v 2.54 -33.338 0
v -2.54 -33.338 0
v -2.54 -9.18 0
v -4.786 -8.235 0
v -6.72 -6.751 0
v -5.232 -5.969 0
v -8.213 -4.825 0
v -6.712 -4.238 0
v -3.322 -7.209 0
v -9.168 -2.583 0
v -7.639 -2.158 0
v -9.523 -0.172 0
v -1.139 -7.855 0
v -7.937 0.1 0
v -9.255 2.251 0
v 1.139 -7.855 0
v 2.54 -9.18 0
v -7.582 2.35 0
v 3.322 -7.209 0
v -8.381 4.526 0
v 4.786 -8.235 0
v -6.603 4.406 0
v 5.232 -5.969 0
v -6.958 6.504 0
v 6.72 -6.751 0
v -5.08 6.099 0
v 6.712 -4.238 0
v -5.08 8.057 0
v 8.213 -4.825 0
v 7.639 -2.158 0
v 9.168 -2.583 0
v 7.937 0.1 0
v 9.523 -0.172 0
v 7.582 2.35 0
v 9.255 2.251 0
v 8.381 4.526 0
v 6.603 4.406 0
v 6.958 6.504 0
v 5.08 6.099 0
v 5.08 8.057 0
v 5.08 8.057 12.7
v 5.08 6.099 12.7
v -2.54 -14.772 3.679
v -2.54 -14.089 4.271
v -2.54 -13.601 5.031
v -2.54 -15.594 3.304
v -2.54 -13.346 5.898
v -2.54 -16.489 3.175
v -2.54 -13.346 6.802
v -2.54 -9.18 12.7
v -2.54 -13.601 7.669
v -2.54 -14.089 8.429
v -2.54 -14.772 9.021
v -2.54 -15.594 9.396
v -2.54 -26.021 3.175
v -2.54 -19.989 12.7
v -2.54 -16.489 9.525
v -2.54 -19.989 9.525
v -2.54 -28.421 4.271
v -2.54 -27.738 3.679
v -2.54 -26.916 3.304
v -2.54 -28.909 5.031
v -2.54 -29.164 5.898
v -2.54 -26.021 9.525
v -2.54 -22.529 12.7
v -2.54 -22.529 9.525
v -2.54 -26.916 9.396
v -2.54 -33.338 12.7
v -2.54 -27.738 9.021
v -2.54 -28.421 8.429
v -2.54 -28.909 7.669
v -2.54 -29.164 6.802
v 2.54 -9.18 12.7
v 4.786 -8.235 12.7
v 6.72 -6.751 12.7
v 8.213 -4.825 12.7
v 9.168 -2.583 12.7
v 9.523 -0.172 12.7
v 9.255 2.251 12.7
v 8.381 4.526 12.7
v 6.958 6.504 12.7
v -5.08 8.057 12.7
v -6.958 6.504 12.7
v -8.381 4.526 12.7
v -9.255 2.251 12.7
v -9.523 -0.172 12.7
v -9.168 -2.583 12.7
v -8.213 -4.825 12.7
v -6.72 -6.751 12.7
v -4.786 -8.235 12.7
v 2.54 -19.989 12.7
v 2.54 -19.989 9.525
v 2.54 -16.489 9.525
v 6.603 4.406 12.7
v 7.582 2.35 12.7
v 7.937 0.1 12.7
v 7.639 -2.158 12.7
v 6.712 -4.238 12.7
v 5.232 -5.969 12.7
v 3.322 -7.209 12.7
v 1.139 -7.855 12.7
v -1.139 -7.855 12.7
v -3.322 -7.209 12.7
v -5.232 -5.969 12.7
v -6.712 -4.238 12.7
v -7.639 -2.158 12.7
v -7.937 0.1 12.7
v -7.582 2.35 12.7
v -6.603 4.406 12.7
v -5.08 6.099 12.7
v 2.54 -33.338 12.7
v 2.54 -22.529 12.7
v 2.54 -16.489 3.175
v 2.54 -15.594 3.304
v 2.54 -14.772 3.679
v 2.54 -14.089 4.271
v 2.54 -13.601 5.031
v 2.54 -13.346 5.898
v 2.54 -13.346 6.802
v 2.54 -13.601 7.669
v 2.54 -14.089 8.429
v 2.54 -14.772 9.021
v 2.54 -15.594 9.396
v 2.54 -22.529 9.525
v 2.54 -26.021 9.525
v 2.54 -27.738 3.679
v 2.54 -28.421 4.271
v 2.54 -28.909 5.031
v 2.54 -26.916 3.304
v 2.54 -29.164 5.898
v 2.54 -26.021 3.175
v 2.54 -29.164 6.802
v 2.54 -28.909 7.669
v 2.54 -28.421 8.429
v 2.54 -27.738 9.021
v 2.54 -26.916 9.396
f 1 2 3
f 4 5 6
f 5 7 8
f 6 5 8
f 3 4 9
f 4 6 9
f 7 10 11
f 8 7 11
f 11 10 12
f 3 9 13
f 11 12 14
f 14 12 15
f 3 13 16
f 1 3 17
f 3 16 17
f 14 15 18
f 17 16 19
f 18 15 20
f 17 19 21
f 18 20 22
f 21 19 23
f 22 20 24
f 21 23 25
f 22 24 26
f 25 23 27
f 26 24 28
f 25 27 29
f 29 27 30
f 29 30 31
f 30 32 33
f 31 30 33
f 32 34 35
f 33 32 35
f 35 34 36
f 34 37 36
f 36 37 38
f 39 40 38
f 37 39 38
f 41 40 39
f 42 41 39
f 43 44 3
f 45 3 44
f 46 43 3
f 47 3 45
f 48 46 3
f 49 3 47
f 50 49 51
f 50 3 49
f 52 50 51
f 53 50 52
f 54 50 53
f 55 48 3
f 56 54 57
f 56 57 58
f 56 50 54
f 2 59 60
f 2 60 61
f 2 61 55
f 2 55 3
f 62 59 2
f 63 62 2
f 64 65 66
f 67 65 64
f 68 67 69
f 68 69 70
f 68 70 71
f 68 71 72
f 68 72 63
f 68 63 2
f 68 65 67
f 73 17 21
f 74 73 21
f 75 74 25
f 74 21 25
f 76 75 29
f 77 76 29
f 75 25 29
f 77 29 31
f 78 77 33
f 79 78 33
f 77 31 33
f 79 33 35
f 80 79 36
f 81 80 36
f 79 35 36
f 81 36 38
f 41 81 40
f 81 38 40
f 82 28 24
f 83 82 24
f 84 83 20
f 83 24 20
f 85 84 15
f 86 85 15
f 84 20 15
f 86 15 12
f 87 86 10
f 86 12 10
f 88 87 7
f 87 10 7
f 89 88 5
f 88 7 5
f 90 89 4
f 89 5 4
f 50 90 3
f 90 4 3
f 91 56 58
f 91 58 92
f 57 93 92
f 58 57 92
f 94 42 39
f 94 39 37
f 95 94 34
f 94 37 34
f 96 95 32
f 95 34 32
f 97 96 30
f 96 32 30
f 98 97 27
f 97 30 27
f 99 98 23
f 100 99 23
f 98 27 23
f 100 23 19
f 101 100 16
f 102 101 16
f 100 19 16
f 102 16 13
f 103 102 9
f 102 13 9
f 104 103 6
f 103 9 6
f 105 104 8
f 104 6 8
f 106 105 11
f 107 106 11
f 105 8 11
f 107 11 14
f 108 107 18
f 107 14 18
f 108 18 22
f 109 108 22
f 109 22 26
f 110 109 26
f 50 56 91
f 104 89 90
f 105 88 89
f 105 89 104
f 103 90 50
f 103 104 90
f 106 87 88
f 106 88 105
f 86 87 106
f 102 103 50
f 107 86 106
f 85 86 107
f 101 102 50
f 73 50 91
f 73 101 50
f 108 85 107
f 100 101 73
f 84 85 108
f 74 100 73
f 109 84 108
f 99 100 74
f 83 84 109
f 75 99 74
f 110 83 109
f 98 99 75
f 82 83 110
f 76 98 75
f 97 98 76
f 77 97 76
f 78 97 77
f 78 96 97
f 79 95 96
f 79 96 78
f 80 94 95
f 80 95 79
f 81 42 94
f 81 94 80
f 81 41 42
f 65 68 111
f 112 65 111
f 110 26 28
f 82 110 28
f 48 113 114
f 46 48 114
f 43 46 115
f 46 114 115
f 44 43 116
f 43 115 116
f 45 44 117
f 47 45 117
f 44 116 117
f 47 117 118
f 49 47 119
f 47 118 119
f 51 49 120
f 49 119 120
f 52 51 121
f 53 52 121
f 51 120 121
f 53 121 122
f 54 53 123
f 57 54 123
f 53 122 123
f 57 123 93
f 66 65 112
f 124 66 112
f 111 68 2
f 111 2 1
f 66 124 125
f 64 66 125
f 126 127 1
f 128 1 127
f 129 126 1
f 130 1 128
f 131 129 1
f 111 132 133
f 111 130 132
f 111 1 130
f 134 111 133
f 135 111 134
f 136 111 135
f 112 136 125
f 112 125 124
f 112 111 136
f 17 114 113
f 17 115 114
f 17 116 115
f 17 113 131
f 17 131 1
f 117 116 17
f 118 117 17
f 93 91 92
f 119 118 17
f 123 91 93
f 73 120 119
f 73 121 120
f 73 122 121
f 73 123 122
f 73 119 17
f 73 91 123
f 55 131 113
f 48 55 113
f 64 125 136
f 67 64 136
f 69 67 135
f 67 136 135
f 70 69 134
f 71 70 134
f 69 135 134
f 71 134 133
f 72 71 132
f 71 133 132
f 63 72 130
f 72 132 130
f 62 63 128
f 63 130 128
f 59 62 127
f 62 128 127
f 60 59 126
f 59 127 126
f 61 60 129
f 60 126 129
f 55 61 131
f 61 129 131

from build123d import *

# Parameters (mm, degrees)
F1_DEPTH = 12.7
F3_DEPTH = 12.7
F5_DEPTH = 5.08
F6_W     = 5.08
F6_H     = 2.54
F7_DEPTH = 3.175


with BuildPart() as f1:
    # F0 (on Top) → F1 (new body)
    with BuildSketch(Plane.XY):
        with BuildLine():
            Line((-5.08, 6.0989758362), (-5.08, 8.0572467382))
            ThreePointArc((-5.08, 8.0572467382), (0, -9.525), (5.08, 8.0572467382))
            Line((5.08, 8.0572467382), (5.08, 6.0989758362))
            ThreePointArc((5.08, 6.0989758362), (0, -7.9375), (-5.08, 6.0989758362))
        make_face()
    extrude(amount=F1_DEPTH)

    # F2 (on face) → F3 (join, through all)
    with BuildSketch(Plane.XY.offset(12.7)):
        with BuildLine():
            ThreePointArc((2.54, -9.1800885072), (0, -9.525), (-2.54, -9.1800885072))
            Line((-2.54, -9.1800885072), (-2.54, -33.3375))
            Line((-2.54, -33.3375), (2.54, -33.3375))
            Line((2.54, -33.3375), (2.54, -9.1800885072))
        make_face()
    extrude(amount=-F3_DEPTH)

    # F4 (on face) → F5 (cut, through all)
    with BuildSketch(Plane.YZ.offset(2.54)):
        with BuildLine():
            Line((-16.4886742536, 9.525), (-26.0212942536, 9.525))
            ThreePointArc((-26.0212942536, 9.525), (-29.1962942536, 6.35), (-26.0212942536, 3.175))
            Line((-26.0212942536, 3.175), (-16.4886742536, 3.175))
            ThreePointArc((-16.4886742536, 3.175), (-13.3136742536, 6.35), (-16.4886742536, 9.525))
        make_face()
    extrude(amount=-F5_DEPTH, mode=Mode.SUBTRACT)

    # F6 (on face) → F7 (cut, through all)
    with BuildSketch(Plane.XY.offset(12.7)):
        with Locations((0, -21.2587942536)):
            Rectangle(F6_W, F6_H)
    extrude(amount=-F7_DEPTH, mode=Mode.SUBTRACT)


solid = f1.part
